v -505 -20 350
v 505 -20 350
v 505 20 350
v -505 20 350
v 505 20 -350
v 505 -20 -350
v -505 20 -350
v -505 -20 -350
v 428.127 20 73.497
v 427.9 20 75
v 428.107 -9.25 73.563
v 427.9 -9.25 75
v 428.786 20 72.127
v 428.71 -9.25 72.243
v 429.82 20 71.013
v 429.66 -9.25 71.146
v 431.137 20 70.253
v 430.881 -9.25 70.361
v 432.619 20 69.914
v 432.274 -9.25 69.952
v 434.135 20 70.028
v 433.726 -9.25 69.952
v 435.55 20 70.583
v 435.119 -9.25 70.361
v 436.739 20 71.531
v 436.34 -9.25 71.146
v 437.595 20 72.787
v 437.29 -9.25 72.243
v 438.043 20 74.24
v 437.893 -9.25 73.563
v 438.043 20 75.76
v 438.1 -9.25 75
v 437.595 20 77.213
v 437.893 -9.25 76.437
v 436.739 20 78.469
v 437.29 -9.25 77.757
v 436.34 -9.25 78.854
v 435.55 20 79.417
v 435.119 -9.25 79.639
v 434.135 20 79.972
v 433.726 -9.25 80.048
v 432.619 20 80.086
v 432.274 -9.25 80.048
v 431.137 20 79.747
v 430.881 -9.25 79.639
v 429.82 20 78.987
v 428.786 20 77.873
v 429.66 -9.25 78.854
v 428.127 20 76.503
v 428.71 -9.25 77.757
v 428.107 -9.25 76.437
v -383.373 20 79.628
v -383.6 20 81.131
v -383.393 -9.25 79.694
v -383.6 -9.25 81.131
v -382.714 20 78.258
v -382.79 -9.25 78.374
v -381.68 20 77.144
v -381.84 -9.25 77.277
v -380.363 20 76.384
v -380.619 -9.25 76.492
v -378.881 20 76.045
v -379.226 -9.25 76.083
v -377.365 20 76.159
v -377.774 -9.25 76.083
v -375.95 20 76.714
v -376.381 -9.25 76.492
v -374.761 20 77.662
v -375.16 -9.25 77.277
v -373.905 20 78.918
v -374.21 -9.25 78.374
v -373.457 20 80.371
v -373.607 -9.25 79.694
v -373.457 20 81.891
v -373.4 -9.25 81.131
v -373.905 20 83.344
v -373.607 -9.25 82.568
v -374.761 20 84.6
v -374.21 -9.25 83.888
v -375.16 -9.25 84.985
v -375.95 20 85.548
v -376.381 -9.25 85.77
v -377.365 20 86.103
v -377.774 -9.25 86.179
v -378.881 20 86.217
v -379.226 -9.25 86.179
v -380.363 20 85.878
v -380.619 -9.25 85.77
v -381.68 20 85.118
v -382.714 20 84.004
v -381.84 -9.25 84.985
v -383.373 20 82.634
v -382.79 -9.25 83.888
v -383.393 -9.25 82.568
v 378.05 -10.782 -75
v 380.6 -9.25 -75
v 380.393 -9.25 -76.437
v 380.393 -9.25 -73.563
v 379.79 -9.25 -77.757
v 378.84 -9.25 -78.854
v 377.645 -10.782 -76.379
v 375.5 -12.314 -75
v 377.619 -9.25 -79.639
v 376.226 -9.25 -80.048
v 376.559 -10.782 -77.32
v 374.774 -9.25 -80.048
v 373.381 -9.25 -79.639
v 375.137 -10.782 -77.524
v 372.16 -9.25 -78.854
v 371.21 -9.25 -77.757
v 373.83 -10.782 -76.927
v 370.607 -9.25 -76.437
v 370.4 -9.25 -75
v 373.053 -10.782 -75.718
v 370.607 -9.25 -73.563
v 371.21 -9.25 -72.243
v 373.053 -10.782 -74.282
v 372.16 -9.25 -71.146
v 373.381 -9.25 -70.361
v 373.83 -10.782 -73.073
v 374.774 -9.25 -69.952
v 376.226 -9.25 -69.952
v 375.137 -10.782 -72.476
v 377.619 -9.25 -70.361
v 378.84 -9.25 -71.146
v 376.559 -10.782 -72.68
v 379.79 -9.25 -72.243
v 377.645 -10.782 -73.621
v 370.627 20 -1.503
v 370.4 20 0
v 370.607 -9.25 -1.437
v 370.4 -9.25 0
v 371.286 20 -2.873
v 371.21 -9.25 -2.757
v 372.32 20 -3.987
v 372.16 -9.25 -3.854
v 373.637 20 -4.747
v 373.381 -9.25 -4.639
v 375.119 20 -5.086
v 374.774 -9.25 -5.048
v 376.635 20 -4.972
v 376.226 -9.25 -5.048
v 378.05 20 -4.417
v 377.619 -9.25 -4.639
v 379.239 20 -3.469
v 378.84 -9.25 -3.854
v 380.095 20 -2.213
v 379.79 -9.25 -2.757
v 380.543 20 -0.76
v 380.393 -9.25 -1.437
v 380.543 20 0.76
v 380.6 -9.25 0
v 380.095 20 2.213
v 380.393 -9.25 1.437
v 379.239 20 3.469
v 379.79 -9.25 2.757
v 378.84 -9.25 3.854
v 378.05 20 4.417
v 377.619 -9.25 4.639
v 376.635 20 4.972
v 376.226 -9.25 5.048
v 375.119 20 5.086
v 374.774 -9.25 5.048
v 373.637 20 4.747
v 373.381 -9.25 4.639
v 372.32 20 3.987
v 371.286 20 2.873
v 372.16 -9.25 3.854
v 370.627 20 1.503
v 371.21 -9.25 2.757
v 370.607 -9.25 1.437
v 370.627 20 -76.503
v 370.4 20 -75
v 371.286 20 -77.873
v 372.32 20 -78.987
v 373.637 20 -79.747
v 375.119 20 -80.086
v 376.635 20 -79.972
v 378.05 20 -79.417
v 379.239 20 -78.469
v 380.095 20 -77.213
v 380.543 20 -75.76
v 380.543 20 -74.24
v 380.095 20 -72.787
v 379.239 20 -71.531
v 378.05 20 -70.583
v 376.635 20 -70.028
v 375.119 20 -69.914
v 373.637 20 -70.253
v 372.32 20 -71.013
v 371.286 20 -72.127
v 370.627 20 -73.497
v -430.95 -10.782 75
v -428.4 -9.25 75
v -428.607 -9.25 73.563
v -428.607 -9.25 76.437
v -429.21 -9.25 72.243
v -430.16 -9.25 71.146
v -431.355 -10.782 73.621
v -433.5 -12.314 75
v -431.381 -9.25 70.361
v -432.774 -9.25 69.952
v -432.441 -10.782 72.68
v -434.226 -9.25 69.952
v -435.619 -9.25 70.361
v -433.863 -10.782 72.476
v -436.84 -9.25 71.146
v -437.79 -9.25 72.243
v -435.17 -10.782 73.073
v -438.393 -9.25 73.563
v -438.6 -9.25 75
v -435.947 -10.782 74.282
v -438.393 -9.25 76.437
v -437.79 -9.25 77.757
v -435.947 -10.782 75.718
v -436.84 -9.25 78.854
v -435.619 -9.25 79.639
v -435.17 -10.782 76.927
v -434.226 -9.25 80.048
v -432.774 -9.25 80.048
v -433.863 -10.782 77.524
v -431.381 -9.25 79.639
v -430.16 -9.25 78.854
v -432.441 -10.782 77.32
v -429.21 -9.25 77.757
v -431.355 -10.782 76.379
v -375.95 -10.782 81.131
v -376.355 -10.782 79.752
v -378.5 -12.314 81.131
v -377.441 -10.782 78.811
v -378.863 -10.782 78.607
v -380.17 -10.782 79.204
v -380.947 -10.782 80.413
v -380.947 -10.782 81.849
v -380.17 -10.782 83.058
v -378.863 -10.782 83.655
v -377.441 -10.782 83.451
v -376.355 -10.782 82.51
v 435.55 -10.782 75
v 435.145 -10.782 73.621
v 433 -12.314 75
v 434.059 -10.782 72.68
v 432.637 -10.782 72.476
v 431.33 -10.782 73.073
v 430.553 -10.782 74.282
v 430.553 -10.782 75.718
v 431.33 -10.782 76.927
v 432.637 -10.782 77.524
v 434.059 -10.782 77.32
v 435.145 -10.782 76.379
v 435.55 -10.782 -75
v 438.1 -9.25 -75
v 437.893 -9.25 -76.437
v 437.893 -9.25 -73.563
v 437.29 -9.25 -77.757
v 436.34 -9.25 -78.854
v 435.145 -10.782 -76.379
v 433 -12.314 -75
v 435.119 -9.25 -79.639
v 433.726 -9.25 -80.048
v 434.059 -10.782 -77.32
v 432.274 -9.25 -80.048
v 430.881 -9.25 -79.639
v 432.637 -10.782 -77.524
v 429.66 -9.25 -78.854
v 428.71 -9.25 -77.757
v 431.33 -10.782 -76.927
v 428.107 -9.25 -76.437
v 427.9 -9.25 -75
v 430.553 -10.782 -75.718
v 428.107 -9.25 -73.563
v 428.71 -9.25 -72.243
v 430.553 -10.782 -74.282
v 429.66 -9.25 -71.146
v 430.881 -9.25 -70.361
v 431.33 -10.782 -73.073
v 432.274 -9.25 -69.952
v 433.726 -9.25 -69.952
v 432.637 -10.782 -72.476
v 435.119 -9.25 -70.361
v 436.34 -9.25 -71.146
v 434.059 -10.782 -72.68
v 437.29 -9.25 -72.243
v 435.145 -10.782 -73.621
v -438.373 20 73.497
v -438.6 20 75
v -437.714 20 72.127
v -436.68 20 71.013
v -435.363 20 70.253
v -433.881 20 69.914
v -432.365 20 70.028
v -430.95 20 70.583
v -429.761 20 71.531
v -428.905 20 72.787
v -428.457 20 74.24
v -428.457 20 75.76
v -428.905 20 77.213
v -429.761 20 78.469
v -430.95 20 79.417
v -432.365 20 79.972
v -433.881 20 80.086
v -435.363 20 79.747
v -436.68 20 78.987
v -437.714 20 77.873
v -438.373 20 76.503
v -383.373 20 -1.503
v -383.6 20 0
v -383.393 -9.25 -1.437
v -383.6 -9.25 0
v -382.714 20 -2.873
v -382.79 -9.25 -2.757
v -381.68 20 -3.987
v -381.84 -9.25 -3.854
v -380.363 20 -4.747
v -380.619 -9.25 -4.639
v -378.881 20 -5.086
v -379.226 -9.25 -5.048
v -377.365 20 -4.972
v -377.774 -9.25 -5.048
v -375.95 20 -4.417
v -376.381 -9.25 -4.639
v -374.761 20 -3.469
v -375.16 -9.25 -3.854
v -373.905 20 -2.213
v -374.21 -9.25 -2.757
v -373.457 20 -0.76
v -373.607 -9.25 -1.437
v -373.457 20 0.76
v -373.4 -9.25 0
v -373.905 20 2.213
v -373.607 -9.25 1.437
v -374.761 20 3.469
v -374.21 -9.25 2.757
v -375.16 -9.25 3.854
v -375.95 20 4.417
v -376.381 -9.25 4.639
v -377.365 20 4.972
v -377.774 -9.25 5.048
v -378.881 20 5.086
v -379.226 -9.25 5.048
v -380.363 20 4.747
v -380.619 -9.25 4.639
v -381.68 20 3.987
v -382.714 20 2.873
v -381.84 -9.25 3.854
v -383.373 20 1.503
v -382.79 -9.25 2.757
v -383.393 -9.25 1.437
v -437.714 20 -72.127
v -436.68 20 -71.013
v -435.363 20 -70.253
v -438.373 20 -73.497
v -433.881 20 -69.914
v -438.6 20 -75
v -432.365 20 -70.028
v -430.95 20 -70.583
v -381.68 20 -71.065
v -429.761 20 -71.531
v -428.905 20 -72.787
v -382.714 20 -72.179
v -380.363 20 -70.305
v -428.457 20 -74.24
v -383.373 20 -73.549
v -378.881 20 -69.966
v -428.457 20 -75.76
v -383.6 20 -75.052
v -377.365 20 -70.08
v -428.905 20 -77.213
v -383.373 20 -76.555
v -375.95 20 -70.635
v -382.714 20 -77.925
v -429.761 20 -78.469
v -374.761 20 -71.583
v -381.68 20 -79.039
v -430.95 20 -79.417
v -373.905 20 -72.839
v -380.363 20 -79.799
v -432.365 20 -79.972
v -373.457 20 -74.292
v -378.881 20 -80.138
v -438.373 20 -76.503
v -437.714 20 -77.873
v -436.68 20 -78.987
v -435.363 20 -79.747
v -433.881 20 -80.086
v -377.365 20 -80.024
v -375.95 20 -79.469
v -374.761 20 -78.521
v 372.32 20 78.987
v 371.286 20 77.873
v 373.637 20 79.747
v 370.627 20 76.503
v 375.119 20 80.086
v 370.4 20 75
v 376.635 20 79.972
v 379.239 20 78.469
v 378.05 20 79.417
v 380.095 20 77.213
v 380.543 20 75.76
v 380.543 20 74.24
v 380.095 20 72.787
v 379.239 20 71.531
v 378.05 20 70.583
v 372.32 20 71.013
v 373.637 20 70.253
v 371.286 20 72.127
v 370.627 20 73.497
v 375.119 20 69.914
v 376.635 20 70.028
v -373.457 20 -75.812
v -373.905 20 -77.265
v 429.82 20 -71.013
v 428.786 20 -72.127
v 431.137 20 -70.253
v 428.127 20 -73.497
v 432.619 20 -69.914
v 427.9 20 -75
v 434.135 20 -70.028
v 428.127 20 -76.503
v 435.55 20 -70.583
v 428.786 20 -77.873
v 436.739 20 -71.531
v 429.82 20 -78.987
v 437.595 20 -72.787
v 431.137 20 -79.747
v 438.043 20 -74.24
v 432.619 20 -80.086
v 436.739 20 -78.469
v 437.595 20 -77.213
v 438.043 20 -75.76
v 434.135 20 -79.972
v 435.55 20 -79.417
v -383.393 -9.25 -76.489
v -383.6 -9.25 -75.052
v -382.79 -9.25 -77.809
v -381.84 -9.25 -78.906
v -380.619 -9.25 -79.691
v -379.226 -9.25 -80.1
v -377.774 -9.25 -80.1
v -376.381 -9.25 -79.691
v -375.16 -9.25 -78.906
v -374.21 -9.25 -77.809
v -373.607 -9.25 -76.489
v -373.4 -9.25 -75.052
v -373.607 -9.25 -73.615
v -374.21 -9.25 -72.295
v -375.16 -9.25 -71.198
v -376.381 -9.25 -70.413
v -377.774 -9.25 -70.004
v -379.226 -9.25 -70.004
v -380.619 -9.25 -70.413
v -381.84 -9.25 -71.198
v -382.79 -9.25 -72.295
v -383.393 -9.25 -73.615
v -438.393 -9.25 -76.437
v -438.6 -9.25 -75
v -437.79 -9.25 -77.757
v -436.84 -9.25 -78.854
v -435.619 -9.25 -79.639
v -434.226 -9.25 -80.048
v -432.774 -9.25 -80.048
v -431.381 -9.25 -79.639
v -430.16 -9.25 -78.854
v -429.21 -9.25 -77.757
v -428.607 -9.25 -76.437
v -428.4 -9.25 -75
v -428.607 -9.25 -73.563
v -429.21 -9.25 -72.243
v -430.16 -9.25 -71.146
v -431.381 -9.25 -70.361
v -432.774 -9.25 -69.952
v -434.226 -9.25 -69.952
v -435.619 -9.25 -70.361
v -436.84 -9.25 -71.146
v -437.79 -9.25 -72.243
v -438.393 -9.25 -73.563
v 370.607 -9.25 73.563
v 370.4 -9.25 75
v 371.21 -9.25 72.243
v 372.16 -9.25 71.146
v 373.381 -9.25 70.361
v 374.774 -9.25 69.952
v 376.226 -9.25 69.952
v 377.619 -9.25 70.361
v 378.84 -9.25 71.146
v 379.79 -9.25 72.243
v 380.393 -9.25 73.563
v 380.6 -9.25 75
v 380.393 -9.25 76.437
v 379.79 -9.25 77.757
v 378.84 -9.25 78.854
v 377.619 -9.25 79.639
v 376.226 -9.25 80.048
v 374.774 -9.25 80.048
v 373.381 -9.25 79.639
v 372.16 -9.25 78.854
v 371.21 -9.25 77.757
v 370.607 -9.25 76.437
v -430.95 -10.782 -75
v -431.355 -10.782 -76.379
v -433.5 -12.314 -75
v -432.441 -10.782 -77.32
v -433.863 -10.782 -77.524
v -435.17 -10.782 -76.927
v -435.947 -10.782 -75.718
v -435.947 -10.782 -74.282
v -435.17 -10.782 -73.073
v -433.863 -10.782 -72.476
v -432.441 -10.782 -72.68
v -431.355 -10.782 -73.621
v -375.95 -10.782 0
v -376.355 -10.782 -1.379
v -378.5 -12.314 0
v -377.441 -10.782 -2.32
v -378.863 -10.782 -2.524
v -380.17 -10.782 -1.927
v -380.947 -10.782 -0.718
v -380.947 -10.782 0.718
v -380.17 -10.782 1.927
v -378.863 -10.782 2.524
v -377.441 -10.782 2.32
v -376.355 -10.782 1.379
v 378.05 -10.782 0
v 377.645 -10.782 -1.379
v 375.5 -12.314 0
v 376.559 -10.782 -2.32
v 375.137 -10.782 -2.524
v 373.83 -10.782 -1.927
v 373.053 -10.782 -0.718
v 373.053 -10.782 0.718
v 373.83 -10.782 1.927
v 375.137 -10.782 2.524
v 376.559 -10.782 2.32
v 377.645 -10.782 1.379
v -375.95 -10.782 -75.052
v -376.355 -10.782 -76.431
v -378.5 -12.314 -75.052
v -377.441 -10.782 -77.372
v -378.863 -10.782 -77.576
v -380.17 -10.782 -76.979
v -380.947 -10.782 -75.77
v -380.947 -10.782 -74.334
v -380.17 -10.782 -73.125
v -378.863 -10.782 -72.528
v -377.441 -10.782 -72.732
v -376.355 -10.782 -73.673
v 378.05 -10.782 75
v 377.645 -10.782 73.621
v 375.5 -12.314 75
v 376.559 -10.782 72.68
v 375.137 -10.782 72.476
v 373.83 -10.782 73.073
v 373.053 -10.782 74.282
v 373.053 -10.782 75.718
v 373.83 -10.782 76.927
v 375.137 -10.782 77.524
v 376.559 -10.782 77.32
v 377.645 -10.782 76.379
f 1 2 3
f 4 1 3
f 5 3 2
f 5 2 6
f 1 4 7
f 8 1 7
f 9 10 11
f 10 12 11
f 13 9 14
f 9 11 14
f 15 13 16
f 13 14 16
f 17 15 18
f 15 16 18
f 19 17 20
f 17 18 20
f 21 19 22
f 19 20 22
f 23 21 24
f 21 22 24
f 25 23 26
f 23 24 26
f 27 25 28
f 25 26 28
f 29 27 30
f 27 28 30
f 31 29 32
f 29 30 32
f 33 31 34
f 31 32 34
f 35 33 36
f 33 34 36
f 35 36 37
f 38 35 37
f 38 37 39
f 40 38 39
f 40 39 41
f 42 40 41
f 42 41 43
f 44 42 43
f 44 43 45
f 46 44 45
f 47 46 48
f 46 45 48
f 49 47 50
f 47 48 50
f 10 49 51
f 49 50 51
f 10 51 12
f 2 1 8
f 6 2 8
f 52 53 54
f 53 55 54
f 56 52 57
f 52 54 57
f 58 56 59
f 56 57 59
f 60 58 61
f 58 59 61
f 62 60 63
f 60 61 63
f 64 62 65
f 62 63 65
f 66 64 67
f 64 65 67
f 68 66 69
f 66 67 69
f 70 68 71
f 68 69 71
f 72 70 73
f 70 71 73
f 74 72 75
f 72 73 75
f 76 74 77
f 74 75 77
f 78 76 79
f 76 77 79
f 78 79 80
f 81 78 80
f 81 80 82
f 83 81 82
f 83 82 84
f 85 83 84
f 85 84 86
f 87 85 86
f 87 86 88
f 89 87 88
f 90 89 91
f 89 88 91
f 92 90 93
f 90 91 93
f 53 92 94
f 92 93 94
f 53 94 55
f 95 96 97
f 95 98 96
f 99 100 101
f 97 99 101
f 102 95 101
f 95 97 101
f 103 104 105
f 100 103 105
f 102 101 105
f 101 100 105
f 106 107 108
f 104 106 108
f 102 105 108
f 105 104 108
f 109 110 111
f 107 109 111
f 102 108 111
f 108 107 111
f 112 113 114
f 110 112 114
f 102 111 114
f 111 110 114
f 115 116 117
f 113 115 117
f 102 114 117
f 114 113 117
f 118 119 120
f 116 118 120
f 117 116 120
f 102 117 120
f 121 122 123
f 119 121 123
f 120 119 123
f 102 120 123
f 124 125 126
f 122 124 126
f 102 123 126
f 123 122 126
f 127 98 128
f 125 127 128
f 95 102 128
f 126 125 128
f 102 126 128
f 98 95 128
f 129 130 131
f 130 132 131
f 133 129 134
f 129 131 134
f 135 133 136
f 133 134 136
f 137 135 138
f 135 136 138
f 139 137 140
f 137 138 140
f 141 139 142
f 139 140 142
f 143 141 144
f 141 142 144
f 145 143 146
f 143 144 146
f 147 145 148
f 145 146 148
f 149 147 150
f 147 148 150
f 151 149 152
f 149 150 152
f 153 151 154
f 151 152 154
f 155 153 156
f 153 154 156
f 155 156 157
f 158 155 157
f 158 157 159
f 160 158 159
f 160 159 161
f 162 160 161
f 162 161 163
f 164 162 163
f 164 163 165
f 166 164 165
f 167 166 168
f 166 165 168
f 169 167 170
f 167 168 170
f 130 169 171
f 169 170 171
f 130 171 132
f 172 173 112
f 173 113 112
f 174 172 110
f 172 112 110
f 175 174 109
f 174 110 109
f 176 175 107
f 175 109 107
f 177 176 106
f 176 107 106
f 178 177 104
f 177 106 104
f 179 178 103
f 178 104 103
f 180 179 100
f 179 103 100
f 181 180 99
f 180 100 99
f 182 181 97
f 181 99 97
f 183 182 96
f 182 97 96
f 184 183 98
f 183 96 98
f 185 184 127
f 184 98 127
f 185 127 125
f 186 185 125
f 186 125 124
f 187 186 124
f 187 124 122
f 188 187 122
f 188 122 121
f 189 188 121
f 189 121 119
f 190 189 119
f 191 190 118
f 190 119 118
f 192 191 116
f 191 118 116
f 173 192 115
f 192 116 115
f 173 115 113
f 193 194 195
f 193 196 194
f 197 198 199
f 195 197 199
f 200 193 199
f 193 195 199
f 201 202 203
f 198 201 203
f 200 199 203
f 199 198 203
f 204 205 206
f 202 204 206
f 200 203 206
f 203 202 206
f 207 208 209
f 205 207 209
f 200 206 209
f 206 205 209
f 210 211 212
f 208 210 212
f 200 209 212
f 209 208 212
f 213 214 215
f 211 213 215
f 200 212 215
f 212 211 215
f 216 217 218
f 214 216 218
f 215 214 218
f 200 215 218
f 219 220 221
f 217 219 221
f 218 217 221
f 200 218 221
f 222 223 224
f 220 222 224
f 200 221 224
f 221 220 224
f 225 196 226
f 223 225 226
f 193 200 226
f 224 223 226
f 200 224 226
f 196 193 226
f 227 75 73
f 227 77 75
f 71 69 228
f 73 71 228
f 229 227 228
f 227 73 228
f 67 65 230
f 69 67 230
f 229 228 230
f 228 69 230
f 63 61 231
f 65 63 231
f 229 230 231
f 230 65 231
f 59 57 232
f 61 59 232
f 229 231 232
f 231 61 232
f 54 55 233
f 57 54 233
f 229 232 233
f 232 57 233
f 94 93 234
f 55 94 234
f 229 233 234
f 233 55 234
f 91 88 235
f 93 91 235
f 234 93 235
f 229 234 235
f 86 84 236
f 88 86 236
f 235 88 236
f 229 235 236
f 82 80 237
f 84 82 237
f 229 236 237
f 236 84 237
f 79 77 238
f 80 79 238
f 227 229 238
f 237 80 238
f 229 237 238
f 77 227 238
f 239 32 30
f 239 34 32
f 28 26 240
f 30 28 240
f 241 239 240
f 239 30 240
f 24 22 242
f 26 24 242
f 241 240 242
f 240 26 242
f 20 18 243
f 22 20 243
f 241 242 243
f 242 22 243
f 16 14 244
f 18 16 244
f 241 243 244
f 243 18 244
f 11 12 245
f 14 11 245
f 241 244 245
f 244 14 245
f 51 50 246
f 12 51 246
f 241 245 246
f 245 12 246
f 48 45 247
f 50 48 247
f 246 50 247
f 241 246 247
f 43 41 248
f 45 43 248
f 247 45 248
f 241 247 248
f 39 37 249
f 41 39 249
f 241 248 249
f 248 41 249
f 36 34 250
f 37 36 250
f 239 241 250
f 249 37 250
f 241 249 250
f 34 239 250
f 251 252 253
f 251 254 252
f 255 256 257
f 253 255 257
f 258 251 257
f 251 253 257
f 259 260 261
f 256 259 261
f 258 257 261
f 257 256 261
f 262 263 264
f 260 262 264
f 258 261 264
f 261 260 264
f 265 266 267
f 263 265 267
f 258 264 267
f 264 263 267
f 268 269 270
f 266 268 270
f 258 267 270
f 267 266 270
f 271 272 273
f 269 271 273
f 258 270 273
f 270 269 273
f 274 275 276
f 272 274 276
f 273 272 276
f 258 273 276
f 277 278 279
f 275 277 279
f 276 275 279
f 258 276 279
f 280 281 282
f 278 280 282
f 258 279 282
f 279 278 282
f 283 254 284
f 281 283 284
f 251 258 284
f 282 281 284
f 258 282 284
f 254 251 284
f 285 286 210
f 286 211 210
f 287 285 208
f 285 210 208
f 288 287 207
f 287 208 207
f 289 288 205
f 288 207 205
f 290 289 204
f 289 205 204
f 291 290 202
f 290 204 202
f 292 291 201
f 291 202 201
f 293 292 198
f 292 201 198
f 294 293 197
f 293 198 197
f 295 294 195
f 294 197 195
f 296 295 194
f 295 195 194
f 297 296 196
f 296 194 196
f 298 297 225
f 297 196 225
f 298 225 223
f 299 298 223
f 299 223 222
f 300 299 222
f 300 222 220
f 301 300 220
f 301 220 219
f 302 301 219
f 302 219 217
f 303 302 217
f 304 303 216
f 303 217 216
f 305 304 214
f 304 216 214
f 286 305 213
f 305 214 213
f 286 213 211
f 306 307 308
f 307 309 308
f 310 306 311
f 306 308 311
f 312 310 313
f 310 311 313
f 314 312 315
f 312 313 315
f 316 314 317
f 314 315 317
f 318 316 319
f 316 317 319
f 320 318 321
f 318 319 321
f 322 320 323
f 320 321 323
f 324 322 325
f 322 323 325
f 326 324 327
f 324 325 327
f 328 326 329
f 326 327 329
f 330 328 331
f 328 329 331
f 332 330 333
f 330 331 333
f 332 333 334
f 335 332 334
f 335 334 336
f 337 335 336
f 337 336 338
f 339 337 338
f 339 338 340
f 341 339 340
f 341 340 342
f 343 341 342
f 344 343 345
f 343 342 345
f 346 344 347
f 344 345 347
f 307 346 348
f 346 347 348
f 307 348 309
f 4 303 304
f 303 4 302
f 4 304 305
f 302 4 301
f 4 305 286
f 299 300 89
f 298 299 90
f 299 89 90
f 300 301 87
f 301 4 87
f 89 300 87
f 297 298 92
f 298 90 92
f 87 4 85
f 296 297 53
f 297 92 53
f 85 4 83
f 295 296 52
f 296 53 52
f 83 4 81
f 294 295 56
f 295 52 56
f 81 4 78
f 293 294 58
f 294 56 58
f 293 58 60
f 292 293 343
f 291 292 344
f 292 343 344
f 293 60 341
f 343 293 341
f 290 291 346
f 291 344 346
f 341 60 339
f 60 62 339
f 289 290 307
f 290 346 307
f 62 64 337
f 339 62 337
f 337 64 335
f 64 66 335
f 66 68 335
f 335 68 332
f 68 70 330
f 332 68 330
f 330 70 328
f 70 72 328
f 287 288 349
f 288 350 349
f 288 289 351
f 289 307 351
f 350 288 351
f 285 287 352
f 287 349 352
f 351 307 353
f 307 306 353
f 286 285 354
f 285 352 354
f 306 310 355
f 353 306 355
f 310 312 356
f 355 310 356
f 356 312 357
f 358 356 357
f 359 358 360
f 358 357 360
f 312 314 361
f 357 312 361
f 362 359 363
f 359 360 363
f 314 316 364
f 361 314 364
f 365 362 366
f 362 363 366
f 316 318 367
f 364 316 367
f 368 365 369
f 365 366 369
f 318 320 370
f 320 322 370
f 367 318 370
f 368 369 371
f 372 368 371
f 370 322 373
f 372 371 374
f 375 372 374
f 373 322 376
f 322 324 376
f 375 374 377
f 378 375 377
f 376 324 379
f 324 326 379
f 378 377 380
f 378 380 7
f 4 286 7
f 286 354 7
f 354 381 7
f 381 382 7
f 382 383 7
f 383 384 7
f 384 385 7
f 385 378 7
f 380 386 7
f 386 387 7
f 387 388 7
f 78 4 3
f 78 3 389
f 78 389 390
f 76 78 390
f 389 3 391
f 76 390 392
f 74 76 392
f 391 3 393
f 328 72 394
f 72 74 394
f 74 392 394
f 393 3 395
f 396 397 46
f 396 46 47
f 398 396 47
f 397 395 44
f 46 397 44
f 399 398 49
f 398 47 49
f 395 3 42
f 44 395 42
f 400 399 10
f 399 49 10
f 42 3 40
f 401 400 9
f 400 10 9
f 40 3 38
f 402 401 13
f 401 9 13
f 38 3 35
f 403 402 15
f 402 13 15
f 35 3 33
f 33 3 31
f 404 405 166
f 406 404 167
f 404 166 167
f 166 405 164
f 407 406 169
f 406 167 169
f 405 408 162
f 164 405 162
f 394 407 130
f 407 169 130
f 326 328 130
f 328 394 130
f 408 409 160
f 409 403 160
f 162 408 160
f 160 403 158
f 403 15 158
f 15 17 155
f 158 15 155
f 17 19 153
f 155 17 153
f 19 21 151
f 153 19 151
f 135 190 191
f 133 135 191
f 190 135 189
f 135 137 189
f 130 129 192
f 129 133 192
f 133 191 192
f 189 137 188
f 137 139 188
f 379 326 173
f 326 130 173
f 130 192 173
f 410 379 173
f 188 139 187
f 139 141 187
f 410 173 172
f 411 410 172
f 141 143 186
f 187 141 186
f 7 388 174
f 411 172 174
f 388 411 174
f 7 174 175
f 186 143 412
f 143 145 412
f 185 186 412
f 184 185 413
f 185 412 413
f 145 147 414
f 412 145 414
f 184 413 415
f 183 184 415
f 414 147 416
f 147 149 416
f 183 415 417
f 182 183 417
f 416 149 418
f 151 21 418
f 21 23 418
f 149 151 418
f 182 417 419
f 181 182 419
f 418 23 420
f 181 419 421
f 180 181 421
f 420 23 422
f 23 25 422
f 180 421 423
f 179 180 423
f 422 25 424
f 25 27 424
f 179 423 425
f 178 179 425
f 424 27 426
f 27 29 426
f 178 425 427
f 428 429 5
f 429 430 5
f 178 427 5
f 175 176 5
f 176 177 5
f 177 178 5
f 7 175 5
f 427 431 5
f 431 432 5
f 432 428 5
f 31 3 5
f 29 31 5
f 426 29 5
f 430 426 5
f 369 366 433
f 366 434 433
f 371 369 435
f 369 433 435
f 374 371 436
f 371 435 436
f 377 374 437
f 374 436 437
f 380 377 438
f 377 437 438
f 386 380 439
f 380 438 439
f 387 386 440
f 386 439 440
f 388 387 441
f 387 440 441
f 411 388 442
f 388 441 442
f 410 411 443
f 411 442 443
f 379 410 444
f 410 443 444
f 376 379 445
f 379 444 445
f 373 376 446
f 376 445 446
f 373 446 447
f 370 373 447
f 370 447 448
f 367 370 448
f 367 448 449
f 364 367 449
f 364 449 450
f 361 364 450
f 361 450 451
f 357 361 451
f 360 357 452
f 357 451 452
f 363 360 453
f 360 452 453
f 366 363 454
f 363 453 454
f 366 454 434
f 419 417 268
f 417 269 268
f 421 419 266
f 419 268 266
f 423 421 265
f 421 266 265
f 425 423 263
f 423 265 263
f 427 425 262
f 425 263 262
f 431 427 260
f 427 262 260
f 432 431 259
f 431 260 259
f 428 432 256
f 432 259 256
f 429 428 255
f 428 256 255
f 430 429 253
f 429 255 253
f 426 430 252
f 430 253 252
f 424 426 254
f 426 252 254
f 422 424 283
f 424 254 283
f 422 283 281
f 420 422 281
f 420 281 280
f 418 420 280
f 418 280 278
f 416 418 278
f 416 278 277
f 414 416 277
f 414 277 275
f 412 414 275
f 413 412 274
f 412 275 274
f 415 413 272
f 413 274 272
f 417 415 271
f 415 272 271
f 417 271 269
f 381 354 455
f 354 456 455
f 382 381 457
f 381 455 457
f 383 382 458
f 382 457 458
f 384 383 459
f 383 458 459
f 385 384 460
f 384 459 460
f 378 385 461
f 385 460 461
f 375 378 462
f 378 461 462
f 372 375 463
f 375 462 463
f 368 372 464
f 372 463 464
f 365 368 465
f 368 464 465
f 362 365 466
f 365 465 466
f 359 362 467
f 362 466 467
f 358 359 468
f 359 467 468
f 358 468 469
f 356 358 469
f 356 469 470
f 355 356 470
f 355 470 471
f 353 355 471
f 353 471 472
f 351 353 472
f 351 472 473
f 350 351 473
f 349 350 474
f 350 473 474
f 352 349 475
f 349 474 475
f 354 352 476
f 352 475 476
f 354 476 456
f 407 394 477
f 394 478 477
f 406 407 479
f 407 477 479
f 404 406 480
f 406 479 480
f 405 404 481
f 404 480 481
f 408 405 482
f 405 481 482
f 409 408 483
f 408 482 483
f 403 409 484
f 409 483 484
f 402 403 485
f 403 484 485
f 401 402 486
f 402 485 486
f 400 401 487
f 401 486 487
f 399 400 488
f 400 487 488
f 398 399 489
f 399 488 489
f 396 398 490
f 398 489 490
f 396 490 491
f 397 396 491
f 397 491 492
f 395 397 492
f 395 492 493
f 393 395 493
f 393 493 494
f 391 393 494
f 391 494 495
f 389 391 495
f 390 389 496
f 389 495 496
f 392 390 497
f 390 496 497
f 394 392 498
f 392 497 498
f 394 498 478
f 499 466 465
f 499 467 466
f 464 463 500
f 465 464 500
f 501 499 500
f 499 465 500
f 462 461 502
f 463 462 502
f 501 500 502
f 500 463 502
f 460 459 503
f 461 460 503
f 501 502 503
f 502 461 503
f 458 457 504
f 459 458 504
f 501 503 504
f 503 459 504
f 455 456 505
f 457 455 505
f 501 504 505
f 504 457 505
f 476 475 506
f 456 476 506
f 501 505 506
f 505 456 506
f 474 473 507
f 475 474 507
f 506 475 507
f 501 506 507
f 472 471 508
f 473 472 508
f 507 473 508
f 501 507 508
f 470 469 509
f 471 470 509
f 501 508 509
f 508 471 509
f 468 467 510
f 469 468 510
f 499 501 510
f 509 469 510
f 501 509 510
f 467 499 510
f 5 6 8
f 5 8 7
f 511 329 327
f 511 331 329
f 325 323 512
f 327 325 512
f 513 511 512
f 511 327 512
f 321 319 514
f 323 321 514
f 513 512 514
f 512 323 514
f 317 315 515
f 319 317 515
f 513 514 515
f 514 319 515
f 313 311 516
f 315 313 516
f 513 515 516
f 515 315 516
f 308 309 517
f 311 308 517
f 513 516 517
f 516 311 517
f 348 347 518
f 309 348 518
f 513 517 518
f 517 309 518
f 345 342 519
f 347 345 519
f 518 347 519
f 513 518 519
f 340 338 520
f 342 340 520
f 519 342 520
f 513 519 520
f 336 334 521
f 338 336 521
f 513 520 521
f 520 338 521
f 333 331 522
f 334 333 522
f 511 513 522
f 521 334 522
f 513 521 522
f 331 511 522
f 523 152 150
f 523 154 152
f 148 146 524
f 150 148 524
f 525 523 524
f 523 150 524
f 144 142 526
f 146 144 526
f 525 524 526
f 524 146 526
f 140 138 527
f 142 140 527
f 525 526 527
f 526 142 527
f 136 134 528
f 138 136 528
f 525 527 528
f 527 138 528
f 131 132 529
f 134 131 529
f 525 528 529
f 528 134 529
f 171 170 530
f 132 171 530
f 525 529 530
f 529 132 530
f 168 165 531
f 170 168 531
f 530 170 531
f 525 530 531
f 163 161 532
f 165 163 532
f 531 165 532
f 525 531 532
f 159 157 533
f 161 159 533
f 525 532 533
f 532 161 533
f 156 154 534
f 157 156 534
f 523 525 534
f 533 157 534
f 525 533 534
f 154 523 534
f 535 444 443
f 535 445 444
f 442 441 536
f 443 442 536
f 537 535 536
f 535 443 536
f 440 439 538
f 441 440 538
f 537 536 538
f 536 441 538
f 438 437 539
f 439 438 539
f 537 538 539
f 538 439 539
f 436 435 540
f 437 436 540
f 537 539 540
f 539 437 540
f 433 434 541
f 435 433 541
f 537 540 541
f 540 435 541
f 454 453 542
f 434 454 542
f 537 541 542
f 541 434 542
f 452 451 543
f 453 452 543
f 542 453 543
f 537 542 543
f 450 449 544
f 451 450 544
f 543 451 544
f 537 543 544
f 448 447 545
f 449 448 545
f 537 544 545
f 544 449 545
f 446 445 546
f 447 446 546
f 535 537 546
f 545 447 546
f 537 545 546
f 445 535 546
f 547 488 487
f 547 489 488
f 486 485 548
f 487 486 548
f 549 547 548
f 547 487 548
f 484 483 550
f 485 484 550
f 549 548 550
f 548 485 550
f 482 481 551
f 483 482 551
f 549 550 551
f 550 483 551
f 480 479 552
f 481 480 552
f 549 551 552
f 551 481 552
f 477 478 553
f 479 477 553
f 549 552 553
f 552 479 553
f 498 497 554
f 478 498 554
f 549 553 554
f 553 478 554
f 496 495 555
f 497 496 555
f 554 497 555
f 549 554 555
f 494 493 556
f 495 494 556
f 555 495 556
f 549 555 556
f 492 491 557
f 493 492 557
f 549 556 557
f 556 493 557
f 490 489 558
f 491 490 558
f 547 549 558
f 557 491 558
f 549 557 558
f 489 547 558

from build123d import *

# Parameters (mm, degrees)
SKETCH1_W              = 700
SKETCH1_H              = 40
BOSS_EXTRUDE1_DEPTH    = 505
M12_TAPPED_HOLE1_D     = 10.2
M12_TAPPED_HOLE1_DEPTH = 29.25
M12_TAPPED_HOLE1_TIP   = 3.064389157


with BuildPart() as part:
    # Sketch1 → Boss-Extrude1 (new, symmetric)
    with BuildSketch(Plane(origin=(0, 0, 0), x_dir=(0, 0, -1), z_dir=(1, 0, 0))):
        Rectangle(SKETCH1_W, SKETCH1_H)
    extrude(amount=BOSS_EXTRUDE1_DEPTH, both=True)

    # M12 Tapped Hole1
    with Locations(Plane(origin=(0, 20, 0), x_dir=(1, 0, 0), z_dir=(0, 1, 0))):
        with Locations((-378.5, 75.052013766), (-433.5, 75), (-378.5, -81.130993075), (-433.5, -75), (433, 75), (375.5, 75), (433, -75), (375.5, -75), (375.5, 0), (-378.5, 0)):
            Hole(M12_TAPPED_HOLE1_D / 2, depth=M12_TAPPED_HOLE1_DEPTH)
            with Locations((0, 0, -(M12_TAPPED_HOLE1_DEPTH + M12_TAPPED_HOLE1_TIP / 2))):  # 118° drill point
                Cone(0, M12_TAPPED_HOLE1_D / 2, M12_TAPPED_HOLE1_TIP, mode=Mode.SUBTRACT)


solid = part.part
